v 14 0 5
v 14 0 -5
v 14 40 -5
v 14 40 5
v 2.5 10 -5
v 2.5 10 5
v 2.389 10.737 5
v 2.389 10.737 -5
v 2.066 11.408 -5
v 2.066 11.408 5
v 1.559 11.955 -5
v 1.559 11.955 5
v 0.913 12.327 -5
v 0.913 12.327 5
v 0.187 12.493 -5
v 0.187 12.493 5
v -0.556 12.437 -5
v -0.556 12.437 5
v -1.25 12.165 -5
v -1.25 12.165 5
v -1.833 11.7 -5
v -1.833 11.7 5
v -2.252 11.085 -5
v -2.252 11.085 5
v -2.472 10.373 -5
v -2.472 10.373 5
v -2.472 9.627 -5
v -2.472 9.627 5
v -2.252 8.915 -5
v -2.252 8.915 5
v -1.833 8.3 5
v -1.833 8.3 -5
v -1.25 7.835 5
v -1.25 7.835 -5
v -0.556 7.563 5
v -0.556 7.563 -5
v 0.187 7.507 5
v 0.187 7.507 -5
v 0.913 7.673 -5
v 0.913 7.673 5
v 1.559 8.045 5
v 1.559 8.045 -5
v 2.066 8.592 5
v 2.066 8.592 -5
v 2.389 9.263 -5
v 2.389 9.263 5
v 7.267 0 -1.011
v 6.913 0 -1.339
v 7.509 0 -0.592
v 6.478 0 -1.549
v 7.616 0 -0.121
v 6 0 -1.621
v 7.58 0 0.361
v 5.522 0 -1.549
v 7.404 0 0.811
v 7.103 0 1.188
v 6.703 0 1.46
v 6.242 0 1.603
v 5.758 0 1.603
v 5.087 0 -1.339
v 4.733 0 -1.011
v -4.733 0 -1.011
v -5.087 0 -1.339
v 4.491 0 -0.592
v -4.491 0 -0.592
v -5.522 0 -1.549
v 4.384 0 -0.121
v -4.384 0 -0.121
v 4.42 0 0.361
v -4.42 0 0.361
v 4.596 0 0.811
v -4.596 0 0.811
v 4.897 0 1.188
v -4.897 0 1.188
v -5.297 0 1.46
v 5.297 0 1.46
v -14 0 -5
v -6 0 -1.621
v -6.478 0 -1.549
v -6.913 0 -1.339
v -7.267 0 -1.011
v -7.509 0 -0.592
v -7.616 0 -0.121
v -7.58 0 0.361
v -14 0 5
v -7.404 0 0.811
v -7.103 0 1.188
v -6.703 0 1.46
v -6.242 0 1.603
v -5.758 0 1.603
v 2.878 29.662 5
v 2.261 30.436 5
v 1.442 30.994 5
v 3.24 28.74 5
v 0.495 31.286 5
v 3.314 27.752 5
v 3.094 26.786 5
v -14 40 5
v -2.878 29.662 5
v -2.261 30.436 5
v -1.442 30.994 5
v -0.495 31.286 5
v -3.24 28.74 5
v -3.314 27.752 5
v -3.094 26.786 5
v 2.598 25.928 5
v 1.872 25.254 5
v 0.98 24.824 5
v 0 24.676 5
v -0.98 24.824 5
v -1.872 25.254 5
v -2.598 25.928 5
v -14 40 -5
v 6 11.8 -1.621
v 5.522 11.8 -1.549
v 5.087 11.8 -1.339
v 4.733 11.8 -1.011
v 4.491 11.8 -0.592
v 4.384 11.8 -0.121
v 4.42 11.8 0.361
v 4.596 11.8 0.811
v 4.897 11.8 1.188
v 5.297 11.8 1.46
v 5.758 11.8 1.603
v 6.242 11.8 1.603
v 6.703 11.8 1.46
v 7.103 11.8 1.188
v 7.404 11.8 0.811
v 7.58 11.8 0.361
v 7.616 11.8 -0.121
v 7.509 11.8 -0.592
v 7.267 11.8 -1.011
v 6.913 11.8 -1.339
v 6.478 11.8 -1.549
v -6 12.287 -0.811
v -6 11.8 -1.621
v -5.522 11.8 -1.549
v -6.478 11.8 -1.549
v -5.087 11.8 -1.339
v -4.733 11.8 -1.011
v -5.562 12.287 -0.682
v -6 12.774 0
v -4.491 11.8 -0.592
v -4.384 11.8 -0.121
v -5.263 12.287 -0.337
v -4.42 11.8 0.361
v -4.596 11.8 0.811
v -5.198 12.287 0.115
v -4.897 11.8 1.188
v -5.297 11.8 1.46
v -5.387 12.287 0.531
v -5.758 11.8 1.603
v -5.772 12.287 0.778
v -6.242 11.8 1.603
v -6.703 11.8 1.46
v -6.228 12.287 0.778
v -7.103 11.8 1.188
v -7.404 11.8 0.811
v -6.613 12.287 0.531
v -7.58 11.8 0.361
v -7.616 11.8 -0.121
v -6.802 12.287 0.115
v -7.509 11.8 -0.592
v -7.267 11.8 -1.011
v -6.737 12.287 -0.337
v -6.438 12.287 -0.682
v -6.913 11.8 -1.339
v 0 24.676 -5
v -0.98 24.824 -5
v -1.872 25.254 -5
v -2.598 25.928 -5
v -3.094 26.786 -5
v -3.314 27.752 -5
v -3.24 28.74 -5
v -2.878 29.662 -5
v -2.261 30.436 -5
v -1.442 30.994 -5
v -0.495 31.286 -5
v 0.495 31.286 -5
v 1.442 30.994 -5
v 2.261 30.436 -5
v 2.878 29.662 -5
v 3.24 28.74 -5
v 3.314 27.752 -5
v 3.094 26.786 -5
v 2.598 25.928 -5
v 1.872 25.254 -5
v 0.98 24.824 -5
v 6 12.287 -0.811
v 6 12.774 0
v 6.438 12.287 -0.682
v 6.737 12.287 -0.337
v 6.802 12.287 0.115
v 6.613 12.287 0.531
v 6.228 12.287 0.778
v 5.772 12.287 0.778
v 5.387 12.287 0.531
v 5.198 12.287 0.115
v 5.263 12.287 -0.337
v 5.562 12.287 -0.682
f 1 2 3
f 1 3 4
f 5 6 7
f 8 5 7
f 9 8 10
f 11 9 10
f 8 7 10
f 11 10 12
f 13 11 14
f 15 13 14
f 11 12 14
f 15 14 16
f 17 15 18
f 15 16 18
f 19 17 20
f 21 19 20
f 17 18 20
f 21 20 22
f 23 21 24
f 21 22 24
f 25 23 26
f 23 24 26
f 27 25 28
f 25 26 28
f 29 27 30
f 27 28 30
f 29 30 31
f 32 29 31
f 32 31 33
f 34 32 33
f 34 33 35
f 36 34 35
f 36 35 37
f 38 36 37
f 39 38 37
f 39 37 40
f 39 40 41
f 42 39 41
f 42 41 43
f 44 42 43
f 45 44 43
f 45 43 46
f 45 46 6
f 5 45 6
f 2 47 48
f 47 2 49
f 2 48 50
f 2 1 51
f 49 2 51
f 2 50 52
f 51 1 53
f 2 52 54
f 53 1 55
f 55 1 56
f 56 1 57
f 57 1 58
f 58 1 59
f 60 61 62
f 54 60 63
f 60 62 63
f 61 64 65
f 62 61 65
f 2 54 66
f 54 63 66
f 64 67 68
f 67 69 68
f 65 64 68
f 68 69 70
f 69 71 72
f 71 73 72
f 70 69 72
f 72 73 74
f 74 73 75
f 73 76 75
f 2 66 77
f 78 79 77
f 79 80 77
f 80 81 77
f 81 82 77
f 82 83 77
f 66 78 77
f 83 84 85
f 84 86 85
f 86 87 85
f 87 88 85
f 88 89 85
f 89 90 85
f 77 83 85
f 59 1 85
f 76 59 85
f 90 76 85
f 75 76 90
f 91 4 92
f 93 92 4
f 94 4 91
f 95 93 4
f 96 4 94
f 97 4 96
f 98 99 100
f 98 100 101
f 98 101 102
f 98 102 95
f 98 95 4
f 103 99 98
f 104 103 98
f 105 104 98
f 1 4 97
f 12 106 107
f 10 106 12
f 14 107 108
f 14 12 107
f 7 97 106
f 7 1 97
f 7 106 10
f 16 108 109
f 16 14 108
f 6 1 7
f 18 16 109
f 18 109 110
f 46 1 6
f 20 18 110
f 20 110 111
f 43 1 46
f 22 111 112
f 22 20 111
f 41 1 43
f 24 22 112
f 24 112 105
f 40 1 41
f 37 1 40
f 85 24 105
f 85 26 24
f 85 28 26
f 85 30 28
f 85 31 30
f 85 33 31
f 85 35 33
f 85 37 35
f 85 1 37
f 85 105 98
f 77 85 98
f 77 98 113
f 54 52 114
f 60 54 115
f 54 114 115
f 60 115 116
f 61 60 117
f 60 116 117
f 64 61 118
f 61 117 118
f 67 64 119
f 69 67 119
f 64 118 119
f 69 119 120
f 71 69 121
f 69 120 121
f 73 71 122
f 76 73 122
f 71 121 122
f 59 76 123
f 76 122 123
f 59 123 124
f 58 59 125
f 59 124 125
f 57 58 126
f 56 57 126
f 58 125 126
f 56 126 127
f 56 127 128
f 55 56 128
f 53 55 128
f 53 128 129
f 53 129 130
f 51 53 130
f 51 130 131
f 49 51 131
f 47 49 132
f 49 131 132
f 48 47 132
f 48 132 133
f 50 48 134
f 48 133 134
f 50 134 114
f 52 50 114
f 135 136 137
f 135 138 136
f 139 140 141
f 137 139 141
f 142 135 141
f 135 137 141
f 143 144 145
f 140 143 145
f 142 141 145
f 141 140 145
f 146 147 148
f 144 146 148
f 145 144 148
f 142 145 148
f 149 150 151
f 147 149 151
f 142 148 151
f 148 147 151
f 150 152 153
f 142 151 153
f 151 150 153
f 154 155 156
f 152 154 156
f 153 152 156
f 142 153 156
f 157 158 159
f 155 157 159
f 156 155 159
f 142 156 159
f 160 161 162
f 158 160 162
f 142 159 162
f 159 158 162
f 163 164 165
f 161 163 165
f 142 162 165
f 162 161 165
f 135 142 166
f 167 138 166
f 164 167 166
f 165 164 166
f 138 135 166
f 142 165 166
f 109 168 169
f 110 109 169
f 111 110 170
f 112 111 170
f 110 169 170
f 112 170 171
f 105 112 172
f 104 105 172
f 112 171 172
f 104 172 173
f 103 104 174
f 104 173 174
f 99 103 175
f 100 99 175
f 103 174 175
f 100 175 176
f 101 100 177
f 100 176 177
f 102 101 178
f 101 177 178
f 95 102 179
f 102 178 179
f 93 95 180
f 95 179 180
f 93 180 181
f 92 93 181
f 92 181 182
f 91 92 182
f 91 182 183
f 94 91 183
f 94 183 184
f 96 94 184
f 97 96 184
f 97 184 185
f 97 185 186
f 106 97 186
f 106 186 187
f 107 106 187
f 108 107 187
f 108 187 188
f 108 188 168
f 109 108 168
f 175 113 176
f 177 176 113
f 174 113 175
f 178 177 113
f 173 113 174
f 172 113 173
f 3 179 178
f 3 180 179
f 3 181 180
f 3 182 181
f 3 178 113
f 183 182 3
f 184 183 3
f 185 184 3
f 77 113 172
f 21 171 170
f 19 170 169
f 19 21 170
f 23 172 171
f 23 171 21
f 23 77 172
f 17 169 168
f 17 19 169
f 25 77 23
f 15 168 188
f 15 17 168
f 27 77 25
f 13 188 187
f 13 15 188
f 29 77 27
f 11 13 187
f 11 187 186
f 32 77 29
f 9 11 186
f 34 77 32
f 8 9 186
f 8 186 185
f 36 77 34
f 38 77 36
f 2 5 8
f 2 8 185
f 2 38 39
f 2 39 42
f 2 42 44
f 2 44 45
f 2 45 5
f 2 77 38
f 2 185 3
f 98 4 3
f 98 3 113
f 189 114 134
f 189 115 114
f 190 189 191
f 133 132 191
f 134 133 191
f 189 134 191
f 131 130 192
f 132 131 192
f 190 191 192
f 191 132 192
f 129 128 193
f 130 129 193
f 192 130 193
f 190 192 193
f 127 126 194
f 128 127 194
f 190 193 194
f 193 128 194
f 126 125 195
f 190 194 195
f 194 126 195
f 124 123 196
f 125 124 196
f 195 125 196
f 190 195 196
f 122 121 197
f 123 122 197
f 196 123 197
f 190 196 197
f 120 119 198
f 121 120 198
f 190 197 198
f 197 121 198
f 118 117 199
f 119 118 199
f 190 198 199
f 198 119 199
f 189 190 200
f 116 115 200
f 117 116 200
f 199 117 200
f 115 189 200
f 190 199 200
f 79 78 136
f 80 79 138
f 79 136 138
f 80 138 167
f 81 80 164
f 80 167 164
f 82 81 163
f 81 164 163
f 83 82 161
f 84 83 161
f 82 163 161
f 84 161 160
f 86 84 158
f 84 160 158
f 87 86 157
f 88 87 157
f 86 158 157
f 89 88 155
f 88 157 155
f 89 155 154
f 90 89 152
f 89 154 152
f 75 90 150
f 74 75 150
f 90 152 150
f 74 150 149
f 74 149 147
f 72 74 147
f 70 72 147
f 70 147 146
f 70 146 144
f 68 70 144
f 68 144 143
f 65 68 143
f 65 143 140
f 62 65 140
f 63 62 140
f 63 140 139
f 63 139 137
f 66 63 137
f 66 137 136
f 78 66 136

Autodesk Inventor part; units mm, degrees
ref_plane "YZ Plane" through (0, 0, 0) normal (1, 0, 0) x (0, 1, 0)
ref_plane "XZ Plane" through (0, 0, 0) normal (0, 1, 0) x (-1, 0, 0)
ref_plane "XY Plane" through (0, 0, 0) normal (0, 0, 1) x (1, 0, 0)
sketch "Boceto1" plane through (0, 0, 0) normal (0, 1, 0) x (-1, 0, 0)
  line L0 (14, -5) -> (-14, -5)
  line L1 (-14, -5) -> (-14, 5)
  line L2 (-14, 5) -> (14, 5)
  line L3 (14, 5) -> (14, -5)
  point P0 (0, 0)
  point P1 (0, -5)
  point P2 (-14, 0)
  dimension "d0" = 28
  dimension "d1" = 10
extrude "Extrusión1" add sketch "Boceto1" along normal blind 40
sketch "Boceto2" plane through (0, 0, 0) normal (0, -1, 0) x (1, 0, 0)
  point P0 (0, 0)
  point P1 (6, 0)
  point P2 (-6, 0)
  dimension "d19" = 12
  dimension "d20" = 6
hole "Agujero1" at (6, 0, 0) at (-6, 0, 0) direction (0, 1, 0) diameter 3.242 depth 11.8 tip angle 118 thread size "M4x0.7" class "6H" standard "ANSI Metric M Profile"
sketch "Boceto3" plane through (-14, 0, 5) normal (0, 0, 1) x (1, 0, 0)
  line L0 (0, 0) -> (28, 0) projected
  point P0 (14, 0)
  point P1 (14, 28)
  point P2 (14, 0)
  dimension "d11" = 28
hole "Agujero2" at (0, 28, 5) direction (0, 0, -1) diameter 6.647 end through all thread size "M8x1.25" class "6H" standard "ANSI Metric M Profile"
sketch "Boceto4" plane through (-14, 0, 5) normal (0, 0, 1) x (1, 0, 0)
  circle A0 centre (14, 10) radius 2.5
  line L0 (0, 0) -> (28, 0) projected
  point P0 (14, 0)
  point P1 (14, 0)
  dimension "d21" = 5
  dimension "d22" = 10
extrude "Extrusión2" cut sketch "Boceto4" against normal blind 10
equation "\"d20\" = 0.5 * d19"
properties part number "Guia sujecion centellador"
